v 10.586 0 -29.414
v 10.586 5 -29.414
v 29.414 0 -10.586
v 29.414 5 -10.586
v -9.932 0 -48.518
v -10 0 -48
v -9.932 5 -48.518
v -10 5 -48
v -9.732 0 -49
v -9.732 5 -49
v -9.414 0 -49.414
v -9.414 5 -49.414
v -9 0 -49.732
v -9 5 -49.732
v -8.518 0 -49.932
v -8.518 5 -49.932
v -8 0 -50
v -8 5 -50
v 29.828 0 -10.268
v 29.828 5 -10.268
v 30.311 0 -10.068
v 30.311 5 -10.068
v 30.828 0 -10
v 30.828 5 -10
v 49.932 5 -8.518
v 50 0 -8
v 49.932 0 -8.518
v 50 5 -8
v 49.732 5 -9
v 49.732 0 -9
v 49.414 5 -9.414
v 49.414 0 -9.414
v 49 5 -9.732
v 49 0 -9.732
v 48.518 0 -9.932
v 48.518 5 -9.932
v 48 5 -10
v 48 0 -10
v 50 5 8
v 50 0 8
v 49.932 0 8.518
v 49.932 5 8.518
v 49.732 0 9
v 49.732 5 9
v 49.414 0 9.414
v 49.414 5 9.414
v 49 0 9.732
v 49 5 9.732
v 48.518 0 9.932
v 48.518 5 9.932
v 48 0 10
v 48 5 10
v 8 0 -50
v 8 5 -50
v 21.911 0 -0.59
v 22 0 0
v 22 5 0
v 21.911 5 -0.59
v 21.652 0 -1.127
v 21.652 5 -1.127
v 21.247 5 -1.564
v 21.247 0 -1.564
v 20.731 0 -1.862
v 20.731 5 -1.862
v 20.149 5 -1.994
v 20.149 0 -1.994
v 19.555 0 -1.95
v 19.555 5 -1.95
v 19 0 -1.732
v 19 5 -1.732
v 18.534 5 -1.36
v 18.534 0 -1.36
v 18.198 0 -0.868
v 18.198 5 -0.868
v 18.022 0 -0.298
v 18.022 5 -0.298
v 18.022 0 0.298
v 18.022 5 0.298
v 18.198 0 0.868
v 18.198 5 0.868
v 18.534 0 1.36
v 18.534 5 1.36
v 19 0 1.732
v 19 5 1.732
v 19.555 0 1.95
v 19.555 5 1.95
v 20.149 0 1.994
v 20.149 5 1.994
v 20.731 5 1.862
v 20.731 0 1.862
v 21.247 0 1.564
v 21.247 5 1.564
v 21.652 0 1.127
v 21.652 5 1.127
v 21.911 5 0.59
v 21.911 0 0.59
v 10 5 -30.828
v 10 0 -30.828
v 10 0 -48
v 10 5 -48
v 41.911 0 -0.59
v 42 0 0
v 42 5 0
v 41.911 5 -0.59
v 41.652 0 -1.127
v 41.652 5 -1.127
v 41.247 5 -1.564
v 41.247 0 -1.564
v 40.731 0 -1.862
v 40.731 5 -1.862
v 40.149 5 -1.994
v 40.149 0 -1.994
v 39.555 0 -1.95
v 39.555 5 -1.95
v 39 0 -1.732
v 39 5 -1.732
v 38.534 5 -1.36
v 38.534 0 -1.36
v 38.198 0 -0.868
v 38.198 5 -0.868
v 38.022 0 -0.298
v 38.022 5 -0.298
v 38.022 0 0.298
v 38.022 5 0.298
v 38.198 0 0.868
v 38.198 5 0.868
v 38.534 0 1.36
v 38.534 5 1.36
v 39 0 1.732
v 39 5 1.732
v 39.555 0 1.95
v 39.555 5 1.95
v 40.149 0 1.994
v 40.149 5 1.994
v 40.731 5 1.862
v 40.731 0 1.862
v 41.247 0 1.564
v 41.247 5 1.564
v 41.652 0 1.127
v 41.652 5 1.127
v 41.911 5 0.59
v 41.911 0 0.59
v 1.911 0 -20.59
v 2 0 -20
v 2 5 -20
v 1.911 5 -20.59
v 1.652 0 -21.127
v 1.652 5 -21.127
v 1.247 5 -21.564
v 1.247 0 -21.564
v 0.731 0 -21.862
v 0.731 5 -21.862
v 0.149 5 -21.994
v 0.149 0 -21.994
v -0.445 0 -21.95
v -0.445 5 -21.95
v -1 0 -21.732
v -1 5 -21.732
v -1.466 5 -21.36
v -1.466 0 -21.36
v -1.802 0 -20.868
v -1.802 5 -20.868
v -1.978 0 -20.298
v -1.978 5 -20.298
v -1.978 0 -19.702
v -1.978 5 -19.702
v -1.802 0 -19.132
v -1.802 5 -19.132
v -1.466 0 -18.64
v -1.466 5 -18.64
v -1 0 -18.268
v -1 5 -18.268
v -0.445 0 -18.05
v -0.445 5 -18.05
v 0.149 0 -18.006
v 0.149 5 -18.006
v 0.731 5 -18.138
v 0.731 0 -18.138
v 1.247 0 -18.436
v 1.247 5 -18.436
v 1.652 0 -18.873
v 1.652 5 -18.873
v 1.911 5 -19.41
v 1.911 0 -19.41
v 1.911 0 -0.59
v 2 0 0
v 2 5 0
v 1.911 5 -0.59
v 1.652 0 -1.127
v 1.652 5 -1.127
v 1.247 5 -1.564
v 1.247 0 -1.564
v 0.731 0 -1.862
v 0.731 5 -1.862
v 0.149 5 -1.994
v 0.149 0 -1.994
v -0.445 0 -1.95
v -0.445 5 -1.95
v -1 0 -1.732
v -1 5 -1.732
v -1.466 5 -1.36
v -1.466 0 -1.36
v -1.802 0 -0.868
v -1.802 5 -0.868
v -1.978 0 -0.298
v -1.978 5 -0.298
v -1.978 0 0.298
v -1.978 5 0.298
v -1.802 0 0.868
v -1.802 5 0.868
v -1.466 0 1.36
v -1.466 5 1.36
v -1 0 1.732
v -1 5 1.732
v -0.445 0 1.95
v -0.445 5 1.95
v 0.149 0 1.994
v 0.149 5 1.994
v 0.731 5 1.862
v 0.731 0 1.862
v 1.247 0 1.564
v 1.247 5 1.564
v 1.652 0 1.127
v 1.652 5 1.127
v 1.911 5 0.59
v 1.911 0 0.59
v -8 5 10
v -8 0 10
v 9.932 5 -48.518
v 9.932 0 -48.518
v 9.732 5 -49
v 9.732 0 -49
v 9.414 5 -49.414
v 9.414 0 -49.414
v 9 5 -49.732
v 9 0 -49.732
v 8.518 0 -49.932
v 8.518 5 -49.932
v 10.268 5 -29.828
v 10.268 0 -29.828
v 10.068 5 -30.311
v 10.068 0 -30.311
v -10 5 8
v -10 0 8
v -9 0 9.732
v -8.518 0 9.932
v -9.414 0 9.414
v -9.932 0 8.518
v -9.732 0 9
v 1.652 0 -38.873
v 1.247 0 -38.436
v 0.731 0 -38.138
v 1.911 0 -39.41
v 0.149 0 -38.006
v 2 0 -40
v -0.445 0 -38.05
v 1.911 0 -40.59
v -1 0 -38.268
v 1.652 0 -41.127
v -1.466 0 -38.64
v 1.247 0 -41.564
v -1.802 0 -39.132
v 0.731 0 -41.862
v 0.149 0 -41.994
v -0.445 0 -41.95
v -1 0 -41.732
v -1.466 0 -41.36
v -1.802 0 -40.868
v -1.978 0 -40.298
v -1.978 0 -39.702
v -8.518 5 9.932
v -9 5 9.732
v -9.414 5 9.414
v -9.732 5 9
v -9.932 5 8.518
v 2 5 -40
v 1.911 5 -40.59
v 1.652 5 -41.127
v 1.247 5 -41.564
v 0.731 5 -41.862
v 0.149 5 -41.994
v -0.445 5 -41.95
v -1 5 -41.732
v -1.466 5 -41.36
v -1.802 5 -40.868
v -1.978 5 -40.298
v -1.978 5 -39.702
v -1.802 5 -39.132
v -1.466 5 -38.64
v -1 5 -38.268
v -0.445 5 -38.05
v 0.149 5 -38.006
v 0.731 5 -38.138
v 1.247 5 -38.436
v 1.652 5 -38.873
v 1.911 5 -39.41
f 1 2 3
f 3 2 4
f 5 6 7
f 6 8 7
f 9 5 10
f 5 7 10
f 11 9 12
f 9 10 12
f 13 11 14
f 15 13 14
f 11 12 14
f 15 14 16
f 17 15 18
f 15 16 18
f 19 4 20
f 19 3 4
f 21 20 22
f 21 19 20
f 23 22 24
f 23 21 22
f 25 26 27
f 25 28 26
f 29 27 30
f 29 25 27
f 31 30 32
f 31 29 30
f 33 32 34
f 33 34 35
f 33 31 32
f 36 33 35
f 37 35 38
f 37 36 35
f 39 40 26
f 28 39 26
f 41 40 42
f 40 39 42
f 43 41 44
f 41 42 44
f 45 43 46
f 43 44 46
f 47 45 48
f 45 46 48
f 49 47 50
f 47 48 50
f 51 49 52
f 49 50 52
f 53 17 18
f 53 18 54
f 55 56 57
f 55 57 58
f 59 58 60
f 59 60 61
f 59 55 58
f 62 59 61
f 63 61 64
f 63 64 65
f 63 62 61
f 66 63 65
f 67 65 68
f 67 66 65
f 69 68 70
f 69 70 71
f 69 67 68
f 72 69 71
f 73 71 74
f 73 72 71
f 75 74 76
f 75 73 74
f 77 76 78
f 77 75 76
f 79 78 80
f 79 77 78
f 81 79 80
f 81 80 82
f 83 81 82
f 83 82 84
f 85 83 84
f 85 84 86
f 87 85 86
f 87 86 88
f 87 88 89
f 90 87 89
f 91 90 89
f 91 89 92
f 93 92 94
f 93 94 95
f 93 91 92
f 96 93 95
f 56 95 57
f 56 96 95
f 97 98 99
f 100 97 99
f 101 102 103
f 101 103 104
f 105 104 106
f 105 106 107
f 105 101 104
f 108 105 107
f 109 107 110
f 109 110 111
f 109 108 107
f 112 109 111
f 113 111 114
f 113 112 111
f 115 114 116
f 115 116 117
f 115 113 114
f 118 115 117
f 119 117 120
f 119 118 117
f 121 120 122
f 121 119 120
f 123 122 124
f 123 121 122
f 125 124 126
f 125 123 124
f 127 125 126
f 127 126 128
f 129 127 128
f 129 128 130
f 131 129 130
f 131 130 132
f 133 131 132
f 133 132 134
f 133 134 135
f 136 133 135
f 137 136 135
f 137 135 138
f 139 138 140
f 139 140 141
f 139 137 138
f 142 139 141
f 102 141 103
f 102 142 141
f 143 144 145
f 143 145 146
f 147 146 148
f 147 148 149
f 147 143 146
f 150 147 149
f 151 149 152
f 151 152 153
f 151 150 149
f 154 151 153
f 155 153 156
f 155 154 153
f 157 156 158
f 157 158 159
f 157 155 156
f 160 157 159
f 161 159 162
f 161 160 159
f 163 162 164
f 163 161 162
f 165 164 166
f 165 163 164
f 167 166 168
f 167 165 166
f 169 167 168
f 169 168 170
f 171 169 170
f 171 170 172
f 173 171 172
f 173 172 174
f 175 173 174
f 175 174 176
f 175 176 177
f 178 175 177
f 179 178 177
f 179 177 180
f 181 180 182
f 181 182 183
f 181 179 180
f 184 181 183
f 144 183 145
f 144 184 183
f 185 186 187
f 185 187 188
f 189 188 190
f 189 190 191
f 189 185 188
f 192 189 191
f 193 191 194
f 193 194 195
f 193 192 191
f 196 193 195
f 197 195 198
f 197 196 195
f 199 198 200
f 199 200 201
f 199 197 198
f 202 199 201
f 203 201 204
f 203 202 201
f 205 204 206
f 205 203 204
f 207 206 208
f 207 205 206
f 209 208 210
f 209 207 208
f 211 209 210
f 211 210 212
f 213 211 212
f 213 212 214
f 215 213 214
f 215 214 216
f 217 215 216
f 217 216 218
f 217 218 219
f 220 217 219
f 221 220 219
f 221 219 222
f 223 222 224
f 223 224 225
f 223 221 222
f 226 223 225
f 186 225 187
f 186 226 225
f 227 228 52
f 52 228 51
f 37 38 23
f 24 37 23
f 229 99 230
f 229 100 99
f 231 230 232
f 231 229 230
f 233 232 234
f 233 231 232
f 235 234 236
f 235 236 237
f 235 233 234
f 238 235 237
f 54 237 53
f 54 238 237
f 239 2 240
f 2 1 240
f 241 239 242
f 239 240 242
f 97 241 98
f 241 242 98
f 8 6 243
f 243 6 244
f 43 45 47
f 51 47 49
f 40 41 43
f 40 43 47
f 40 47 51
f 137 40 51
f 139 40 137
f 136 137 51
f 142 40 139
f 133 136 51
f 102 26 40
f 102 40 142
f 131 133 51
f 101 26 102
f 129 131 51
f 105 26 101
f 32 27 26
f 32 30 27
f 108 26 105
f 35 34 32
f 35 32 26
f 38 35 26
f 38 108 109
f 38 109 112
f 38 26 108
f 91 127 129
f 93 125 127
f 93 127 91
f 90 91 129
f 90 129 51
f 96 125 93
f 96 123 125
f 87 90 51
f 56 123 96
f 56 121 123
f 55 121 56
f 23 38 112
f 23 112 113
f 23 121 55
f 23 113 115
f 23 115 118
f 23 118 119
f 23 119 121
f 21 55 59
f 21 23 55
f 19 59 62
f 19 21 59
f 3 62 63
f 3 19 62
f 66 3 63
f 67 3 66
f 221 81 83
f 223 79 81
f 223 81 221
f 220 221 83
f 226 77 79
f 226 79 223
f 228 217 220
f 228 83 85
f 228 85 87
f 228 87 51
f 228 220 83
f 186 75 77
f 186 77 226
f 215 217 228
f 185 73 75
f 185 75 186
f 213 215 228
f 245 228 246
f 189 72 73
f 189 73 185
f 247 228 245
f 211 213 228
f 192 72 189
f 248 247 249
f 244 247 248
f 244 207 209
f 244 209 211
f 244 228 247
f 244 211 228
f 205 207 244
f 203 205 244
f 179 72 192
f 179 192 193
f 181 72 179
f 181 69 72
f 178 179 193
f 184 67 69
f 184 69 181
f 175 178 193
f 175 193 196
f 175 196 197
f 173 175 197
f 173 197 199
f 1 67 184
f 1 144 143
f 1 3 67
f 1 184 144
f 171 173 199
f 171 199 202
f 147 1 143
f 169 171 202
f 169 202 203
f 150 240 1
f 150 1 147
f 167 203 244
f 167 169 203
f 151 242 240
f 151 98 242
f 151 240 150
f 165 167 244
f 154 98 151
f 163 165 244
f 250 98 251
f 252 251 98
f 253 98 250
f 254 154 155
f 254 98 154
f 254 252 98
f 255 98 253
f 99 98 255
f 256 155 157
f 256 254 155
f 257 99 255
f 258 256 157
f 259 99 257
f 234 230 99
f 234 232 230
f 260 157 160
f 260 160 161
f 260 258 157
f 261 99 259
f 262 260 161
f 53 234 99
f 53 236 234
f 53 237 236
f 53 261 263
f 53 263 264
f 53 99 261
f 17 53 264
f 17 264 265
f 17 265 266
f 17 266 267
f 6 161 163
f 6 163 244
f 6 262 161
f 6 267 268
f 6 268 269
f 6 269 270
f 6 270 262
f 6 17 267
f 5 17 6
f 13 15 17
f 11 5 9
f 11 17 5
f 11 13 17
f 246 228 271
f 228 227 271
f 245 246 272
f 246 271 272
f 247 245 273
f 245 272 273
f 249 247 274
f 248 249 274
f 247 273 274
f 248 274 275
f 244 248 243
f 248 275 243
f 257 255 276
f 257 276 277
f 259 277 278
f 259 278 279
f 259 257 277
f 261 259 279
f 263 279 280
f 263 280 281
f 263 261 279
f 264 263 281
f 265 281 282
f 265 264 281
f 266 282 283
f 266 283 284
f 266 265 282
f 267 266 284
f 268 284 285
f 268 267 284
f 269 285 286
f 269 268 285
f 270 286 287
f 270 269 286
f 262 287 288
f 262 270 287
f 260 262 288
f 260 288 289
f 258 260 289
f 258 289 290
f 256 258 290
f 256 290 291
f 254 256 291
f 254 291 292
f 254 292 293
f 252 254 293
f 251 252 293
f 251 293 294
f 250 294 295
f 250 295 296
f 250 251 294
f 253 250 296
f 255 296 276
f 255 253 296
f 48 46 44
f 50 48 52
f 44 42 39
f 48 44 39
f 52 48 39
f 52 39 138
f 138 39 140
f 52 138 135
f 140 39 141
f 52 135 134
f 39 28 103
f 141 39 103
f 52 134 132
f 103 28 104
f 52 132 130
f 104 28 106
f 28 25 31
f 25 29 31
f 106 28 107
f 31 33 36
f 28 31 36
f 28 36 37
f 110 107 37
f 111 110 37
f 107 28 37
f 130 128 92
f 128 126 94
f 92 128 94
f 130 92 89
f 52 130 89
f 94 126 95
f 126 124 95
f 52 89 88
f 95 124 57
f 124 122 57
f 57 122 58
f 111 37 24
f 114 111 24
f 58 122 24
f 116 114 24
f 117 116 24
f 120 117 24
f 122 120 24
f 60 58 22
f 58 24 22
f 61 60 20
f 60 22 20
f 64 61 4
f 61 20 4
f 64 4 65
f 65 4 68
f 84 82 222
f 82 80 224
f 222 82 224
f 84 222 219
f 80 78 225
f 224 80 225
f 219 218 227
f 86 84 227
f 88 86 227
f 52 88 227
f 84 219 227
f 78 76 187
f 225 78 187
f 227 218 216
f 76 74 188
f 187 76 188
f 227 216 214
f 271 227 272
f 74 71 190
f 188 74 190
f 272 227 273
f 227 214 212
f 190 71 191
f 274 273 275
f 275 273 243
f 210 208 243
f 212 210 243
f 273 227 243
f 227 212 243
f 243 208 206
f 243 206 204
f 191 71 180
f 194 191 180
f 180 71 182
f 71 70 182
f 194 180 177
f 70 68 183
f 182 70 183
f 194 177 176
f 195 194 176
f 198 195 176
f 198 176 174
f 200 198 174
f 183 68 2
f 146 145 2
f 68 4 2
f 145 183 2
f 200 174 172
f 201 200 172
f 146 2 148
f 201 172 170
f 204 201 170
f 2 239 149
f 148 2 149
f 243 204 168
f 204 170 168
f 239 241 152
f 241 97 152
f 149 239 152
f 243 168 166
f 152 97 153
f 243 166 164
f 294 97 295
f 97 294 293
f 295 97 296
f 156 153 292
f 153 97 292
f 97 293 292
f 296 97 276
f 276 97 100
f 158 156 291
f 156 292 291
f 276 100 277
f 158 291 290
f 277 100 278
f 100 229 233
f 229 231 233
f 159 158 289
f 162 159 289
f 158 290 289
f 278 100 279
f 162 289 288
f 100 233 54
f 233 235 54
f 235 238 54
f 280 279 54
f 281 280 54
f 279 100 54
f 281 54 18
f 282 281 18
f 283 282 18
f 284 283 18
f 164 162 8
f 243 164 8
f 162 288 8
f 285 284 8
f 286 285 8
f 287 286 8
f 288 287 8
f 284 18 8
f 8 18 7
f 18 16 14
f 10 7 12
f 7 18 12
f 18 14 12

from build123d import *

# Parameters (mm, degrees)
SKETCH1_W           = 40
SKETCH1_H           = 20
SKETCH1_R           = 2
SKETCH1_W_2         = 20
SKETCH1_H_2         = 40
BOSS_EXTRUDE1_DEPTH = 5
FILLET1_R           = 2
BOSS_EXTRUDE2_DEPTH = 5
FILLET2_R           = 2


with BuildPart() as part:
    # Sketch1 → Boss-Extrude1 (new body)
    with BuildSketch(Plane(origin=(0, 0, 0), x_dir=(1, 0, 0), z_dir=(0, 1, 0))):
        with Locations((30, 0)):
            Rectangle(SKETCH1_W, SKETCH1_H)
        with Locations((20, 0)):
            Circle(SKETCH1_R, mode=Mode.SUBTRACT)
        with Locations((40, 0)):
            Circle(SKETCH1_R, mode=Mode.SUBTRACT)
        Rectangle(SKETCH1_W_2, SKETCH1_H)
        Circle(SKETCH1_R, mode=Mode.SUBTRACT)
        with Locations((0, 30)):
            Rectangle(SKETCH1_W_2, SKETCH1_H_2)
        with Locations((0, 20)):
            Circle(SKETCH1_R, mode=Mode.SUBTRACT)
        with Locations((0, 40)):
            Circle(SKETCH1_R, mode=Mode.SUBTRACT)
    extrude(amount=BOSS_EXTRUDE1_DEPTH)

    # Fillet1
    fillet1_edges = [part.edges().sort_by_distance(p)[0] for p in [
        (-10, 2.5, 10),
        (-10, 2.5, -50),
        (10, 2.5, -50),
        (10, 2.5, -10),
        (50, 2.5, -10),
        (50, 2.5, 10),
    ]]
    fillet(fillet1_edges, radius=FILLET1_R)

    # Sketch2 → Boss-Extrude2 (add)
    with BuildSketch(Plane(origin=(0, 5, 0), x_dir=(1, 0, 0), z_dir=(0, 1, 0))):
        Polygon((10, 30), (30, 10), (7.050252532, 7.050252532), align=None)
    extrude(amount=-BOSS_EXTRUDE2_DEPTH)

    # Fillet2
    fillet2_edges = [part.edges().sort_by_distance(p)[0] for p in [
        (10, 2.5, -30),
        (30, 2.5, -10),
    ]]
    fillet(fillet2_edges, radius=FILLET2_R)


solid = part.part
